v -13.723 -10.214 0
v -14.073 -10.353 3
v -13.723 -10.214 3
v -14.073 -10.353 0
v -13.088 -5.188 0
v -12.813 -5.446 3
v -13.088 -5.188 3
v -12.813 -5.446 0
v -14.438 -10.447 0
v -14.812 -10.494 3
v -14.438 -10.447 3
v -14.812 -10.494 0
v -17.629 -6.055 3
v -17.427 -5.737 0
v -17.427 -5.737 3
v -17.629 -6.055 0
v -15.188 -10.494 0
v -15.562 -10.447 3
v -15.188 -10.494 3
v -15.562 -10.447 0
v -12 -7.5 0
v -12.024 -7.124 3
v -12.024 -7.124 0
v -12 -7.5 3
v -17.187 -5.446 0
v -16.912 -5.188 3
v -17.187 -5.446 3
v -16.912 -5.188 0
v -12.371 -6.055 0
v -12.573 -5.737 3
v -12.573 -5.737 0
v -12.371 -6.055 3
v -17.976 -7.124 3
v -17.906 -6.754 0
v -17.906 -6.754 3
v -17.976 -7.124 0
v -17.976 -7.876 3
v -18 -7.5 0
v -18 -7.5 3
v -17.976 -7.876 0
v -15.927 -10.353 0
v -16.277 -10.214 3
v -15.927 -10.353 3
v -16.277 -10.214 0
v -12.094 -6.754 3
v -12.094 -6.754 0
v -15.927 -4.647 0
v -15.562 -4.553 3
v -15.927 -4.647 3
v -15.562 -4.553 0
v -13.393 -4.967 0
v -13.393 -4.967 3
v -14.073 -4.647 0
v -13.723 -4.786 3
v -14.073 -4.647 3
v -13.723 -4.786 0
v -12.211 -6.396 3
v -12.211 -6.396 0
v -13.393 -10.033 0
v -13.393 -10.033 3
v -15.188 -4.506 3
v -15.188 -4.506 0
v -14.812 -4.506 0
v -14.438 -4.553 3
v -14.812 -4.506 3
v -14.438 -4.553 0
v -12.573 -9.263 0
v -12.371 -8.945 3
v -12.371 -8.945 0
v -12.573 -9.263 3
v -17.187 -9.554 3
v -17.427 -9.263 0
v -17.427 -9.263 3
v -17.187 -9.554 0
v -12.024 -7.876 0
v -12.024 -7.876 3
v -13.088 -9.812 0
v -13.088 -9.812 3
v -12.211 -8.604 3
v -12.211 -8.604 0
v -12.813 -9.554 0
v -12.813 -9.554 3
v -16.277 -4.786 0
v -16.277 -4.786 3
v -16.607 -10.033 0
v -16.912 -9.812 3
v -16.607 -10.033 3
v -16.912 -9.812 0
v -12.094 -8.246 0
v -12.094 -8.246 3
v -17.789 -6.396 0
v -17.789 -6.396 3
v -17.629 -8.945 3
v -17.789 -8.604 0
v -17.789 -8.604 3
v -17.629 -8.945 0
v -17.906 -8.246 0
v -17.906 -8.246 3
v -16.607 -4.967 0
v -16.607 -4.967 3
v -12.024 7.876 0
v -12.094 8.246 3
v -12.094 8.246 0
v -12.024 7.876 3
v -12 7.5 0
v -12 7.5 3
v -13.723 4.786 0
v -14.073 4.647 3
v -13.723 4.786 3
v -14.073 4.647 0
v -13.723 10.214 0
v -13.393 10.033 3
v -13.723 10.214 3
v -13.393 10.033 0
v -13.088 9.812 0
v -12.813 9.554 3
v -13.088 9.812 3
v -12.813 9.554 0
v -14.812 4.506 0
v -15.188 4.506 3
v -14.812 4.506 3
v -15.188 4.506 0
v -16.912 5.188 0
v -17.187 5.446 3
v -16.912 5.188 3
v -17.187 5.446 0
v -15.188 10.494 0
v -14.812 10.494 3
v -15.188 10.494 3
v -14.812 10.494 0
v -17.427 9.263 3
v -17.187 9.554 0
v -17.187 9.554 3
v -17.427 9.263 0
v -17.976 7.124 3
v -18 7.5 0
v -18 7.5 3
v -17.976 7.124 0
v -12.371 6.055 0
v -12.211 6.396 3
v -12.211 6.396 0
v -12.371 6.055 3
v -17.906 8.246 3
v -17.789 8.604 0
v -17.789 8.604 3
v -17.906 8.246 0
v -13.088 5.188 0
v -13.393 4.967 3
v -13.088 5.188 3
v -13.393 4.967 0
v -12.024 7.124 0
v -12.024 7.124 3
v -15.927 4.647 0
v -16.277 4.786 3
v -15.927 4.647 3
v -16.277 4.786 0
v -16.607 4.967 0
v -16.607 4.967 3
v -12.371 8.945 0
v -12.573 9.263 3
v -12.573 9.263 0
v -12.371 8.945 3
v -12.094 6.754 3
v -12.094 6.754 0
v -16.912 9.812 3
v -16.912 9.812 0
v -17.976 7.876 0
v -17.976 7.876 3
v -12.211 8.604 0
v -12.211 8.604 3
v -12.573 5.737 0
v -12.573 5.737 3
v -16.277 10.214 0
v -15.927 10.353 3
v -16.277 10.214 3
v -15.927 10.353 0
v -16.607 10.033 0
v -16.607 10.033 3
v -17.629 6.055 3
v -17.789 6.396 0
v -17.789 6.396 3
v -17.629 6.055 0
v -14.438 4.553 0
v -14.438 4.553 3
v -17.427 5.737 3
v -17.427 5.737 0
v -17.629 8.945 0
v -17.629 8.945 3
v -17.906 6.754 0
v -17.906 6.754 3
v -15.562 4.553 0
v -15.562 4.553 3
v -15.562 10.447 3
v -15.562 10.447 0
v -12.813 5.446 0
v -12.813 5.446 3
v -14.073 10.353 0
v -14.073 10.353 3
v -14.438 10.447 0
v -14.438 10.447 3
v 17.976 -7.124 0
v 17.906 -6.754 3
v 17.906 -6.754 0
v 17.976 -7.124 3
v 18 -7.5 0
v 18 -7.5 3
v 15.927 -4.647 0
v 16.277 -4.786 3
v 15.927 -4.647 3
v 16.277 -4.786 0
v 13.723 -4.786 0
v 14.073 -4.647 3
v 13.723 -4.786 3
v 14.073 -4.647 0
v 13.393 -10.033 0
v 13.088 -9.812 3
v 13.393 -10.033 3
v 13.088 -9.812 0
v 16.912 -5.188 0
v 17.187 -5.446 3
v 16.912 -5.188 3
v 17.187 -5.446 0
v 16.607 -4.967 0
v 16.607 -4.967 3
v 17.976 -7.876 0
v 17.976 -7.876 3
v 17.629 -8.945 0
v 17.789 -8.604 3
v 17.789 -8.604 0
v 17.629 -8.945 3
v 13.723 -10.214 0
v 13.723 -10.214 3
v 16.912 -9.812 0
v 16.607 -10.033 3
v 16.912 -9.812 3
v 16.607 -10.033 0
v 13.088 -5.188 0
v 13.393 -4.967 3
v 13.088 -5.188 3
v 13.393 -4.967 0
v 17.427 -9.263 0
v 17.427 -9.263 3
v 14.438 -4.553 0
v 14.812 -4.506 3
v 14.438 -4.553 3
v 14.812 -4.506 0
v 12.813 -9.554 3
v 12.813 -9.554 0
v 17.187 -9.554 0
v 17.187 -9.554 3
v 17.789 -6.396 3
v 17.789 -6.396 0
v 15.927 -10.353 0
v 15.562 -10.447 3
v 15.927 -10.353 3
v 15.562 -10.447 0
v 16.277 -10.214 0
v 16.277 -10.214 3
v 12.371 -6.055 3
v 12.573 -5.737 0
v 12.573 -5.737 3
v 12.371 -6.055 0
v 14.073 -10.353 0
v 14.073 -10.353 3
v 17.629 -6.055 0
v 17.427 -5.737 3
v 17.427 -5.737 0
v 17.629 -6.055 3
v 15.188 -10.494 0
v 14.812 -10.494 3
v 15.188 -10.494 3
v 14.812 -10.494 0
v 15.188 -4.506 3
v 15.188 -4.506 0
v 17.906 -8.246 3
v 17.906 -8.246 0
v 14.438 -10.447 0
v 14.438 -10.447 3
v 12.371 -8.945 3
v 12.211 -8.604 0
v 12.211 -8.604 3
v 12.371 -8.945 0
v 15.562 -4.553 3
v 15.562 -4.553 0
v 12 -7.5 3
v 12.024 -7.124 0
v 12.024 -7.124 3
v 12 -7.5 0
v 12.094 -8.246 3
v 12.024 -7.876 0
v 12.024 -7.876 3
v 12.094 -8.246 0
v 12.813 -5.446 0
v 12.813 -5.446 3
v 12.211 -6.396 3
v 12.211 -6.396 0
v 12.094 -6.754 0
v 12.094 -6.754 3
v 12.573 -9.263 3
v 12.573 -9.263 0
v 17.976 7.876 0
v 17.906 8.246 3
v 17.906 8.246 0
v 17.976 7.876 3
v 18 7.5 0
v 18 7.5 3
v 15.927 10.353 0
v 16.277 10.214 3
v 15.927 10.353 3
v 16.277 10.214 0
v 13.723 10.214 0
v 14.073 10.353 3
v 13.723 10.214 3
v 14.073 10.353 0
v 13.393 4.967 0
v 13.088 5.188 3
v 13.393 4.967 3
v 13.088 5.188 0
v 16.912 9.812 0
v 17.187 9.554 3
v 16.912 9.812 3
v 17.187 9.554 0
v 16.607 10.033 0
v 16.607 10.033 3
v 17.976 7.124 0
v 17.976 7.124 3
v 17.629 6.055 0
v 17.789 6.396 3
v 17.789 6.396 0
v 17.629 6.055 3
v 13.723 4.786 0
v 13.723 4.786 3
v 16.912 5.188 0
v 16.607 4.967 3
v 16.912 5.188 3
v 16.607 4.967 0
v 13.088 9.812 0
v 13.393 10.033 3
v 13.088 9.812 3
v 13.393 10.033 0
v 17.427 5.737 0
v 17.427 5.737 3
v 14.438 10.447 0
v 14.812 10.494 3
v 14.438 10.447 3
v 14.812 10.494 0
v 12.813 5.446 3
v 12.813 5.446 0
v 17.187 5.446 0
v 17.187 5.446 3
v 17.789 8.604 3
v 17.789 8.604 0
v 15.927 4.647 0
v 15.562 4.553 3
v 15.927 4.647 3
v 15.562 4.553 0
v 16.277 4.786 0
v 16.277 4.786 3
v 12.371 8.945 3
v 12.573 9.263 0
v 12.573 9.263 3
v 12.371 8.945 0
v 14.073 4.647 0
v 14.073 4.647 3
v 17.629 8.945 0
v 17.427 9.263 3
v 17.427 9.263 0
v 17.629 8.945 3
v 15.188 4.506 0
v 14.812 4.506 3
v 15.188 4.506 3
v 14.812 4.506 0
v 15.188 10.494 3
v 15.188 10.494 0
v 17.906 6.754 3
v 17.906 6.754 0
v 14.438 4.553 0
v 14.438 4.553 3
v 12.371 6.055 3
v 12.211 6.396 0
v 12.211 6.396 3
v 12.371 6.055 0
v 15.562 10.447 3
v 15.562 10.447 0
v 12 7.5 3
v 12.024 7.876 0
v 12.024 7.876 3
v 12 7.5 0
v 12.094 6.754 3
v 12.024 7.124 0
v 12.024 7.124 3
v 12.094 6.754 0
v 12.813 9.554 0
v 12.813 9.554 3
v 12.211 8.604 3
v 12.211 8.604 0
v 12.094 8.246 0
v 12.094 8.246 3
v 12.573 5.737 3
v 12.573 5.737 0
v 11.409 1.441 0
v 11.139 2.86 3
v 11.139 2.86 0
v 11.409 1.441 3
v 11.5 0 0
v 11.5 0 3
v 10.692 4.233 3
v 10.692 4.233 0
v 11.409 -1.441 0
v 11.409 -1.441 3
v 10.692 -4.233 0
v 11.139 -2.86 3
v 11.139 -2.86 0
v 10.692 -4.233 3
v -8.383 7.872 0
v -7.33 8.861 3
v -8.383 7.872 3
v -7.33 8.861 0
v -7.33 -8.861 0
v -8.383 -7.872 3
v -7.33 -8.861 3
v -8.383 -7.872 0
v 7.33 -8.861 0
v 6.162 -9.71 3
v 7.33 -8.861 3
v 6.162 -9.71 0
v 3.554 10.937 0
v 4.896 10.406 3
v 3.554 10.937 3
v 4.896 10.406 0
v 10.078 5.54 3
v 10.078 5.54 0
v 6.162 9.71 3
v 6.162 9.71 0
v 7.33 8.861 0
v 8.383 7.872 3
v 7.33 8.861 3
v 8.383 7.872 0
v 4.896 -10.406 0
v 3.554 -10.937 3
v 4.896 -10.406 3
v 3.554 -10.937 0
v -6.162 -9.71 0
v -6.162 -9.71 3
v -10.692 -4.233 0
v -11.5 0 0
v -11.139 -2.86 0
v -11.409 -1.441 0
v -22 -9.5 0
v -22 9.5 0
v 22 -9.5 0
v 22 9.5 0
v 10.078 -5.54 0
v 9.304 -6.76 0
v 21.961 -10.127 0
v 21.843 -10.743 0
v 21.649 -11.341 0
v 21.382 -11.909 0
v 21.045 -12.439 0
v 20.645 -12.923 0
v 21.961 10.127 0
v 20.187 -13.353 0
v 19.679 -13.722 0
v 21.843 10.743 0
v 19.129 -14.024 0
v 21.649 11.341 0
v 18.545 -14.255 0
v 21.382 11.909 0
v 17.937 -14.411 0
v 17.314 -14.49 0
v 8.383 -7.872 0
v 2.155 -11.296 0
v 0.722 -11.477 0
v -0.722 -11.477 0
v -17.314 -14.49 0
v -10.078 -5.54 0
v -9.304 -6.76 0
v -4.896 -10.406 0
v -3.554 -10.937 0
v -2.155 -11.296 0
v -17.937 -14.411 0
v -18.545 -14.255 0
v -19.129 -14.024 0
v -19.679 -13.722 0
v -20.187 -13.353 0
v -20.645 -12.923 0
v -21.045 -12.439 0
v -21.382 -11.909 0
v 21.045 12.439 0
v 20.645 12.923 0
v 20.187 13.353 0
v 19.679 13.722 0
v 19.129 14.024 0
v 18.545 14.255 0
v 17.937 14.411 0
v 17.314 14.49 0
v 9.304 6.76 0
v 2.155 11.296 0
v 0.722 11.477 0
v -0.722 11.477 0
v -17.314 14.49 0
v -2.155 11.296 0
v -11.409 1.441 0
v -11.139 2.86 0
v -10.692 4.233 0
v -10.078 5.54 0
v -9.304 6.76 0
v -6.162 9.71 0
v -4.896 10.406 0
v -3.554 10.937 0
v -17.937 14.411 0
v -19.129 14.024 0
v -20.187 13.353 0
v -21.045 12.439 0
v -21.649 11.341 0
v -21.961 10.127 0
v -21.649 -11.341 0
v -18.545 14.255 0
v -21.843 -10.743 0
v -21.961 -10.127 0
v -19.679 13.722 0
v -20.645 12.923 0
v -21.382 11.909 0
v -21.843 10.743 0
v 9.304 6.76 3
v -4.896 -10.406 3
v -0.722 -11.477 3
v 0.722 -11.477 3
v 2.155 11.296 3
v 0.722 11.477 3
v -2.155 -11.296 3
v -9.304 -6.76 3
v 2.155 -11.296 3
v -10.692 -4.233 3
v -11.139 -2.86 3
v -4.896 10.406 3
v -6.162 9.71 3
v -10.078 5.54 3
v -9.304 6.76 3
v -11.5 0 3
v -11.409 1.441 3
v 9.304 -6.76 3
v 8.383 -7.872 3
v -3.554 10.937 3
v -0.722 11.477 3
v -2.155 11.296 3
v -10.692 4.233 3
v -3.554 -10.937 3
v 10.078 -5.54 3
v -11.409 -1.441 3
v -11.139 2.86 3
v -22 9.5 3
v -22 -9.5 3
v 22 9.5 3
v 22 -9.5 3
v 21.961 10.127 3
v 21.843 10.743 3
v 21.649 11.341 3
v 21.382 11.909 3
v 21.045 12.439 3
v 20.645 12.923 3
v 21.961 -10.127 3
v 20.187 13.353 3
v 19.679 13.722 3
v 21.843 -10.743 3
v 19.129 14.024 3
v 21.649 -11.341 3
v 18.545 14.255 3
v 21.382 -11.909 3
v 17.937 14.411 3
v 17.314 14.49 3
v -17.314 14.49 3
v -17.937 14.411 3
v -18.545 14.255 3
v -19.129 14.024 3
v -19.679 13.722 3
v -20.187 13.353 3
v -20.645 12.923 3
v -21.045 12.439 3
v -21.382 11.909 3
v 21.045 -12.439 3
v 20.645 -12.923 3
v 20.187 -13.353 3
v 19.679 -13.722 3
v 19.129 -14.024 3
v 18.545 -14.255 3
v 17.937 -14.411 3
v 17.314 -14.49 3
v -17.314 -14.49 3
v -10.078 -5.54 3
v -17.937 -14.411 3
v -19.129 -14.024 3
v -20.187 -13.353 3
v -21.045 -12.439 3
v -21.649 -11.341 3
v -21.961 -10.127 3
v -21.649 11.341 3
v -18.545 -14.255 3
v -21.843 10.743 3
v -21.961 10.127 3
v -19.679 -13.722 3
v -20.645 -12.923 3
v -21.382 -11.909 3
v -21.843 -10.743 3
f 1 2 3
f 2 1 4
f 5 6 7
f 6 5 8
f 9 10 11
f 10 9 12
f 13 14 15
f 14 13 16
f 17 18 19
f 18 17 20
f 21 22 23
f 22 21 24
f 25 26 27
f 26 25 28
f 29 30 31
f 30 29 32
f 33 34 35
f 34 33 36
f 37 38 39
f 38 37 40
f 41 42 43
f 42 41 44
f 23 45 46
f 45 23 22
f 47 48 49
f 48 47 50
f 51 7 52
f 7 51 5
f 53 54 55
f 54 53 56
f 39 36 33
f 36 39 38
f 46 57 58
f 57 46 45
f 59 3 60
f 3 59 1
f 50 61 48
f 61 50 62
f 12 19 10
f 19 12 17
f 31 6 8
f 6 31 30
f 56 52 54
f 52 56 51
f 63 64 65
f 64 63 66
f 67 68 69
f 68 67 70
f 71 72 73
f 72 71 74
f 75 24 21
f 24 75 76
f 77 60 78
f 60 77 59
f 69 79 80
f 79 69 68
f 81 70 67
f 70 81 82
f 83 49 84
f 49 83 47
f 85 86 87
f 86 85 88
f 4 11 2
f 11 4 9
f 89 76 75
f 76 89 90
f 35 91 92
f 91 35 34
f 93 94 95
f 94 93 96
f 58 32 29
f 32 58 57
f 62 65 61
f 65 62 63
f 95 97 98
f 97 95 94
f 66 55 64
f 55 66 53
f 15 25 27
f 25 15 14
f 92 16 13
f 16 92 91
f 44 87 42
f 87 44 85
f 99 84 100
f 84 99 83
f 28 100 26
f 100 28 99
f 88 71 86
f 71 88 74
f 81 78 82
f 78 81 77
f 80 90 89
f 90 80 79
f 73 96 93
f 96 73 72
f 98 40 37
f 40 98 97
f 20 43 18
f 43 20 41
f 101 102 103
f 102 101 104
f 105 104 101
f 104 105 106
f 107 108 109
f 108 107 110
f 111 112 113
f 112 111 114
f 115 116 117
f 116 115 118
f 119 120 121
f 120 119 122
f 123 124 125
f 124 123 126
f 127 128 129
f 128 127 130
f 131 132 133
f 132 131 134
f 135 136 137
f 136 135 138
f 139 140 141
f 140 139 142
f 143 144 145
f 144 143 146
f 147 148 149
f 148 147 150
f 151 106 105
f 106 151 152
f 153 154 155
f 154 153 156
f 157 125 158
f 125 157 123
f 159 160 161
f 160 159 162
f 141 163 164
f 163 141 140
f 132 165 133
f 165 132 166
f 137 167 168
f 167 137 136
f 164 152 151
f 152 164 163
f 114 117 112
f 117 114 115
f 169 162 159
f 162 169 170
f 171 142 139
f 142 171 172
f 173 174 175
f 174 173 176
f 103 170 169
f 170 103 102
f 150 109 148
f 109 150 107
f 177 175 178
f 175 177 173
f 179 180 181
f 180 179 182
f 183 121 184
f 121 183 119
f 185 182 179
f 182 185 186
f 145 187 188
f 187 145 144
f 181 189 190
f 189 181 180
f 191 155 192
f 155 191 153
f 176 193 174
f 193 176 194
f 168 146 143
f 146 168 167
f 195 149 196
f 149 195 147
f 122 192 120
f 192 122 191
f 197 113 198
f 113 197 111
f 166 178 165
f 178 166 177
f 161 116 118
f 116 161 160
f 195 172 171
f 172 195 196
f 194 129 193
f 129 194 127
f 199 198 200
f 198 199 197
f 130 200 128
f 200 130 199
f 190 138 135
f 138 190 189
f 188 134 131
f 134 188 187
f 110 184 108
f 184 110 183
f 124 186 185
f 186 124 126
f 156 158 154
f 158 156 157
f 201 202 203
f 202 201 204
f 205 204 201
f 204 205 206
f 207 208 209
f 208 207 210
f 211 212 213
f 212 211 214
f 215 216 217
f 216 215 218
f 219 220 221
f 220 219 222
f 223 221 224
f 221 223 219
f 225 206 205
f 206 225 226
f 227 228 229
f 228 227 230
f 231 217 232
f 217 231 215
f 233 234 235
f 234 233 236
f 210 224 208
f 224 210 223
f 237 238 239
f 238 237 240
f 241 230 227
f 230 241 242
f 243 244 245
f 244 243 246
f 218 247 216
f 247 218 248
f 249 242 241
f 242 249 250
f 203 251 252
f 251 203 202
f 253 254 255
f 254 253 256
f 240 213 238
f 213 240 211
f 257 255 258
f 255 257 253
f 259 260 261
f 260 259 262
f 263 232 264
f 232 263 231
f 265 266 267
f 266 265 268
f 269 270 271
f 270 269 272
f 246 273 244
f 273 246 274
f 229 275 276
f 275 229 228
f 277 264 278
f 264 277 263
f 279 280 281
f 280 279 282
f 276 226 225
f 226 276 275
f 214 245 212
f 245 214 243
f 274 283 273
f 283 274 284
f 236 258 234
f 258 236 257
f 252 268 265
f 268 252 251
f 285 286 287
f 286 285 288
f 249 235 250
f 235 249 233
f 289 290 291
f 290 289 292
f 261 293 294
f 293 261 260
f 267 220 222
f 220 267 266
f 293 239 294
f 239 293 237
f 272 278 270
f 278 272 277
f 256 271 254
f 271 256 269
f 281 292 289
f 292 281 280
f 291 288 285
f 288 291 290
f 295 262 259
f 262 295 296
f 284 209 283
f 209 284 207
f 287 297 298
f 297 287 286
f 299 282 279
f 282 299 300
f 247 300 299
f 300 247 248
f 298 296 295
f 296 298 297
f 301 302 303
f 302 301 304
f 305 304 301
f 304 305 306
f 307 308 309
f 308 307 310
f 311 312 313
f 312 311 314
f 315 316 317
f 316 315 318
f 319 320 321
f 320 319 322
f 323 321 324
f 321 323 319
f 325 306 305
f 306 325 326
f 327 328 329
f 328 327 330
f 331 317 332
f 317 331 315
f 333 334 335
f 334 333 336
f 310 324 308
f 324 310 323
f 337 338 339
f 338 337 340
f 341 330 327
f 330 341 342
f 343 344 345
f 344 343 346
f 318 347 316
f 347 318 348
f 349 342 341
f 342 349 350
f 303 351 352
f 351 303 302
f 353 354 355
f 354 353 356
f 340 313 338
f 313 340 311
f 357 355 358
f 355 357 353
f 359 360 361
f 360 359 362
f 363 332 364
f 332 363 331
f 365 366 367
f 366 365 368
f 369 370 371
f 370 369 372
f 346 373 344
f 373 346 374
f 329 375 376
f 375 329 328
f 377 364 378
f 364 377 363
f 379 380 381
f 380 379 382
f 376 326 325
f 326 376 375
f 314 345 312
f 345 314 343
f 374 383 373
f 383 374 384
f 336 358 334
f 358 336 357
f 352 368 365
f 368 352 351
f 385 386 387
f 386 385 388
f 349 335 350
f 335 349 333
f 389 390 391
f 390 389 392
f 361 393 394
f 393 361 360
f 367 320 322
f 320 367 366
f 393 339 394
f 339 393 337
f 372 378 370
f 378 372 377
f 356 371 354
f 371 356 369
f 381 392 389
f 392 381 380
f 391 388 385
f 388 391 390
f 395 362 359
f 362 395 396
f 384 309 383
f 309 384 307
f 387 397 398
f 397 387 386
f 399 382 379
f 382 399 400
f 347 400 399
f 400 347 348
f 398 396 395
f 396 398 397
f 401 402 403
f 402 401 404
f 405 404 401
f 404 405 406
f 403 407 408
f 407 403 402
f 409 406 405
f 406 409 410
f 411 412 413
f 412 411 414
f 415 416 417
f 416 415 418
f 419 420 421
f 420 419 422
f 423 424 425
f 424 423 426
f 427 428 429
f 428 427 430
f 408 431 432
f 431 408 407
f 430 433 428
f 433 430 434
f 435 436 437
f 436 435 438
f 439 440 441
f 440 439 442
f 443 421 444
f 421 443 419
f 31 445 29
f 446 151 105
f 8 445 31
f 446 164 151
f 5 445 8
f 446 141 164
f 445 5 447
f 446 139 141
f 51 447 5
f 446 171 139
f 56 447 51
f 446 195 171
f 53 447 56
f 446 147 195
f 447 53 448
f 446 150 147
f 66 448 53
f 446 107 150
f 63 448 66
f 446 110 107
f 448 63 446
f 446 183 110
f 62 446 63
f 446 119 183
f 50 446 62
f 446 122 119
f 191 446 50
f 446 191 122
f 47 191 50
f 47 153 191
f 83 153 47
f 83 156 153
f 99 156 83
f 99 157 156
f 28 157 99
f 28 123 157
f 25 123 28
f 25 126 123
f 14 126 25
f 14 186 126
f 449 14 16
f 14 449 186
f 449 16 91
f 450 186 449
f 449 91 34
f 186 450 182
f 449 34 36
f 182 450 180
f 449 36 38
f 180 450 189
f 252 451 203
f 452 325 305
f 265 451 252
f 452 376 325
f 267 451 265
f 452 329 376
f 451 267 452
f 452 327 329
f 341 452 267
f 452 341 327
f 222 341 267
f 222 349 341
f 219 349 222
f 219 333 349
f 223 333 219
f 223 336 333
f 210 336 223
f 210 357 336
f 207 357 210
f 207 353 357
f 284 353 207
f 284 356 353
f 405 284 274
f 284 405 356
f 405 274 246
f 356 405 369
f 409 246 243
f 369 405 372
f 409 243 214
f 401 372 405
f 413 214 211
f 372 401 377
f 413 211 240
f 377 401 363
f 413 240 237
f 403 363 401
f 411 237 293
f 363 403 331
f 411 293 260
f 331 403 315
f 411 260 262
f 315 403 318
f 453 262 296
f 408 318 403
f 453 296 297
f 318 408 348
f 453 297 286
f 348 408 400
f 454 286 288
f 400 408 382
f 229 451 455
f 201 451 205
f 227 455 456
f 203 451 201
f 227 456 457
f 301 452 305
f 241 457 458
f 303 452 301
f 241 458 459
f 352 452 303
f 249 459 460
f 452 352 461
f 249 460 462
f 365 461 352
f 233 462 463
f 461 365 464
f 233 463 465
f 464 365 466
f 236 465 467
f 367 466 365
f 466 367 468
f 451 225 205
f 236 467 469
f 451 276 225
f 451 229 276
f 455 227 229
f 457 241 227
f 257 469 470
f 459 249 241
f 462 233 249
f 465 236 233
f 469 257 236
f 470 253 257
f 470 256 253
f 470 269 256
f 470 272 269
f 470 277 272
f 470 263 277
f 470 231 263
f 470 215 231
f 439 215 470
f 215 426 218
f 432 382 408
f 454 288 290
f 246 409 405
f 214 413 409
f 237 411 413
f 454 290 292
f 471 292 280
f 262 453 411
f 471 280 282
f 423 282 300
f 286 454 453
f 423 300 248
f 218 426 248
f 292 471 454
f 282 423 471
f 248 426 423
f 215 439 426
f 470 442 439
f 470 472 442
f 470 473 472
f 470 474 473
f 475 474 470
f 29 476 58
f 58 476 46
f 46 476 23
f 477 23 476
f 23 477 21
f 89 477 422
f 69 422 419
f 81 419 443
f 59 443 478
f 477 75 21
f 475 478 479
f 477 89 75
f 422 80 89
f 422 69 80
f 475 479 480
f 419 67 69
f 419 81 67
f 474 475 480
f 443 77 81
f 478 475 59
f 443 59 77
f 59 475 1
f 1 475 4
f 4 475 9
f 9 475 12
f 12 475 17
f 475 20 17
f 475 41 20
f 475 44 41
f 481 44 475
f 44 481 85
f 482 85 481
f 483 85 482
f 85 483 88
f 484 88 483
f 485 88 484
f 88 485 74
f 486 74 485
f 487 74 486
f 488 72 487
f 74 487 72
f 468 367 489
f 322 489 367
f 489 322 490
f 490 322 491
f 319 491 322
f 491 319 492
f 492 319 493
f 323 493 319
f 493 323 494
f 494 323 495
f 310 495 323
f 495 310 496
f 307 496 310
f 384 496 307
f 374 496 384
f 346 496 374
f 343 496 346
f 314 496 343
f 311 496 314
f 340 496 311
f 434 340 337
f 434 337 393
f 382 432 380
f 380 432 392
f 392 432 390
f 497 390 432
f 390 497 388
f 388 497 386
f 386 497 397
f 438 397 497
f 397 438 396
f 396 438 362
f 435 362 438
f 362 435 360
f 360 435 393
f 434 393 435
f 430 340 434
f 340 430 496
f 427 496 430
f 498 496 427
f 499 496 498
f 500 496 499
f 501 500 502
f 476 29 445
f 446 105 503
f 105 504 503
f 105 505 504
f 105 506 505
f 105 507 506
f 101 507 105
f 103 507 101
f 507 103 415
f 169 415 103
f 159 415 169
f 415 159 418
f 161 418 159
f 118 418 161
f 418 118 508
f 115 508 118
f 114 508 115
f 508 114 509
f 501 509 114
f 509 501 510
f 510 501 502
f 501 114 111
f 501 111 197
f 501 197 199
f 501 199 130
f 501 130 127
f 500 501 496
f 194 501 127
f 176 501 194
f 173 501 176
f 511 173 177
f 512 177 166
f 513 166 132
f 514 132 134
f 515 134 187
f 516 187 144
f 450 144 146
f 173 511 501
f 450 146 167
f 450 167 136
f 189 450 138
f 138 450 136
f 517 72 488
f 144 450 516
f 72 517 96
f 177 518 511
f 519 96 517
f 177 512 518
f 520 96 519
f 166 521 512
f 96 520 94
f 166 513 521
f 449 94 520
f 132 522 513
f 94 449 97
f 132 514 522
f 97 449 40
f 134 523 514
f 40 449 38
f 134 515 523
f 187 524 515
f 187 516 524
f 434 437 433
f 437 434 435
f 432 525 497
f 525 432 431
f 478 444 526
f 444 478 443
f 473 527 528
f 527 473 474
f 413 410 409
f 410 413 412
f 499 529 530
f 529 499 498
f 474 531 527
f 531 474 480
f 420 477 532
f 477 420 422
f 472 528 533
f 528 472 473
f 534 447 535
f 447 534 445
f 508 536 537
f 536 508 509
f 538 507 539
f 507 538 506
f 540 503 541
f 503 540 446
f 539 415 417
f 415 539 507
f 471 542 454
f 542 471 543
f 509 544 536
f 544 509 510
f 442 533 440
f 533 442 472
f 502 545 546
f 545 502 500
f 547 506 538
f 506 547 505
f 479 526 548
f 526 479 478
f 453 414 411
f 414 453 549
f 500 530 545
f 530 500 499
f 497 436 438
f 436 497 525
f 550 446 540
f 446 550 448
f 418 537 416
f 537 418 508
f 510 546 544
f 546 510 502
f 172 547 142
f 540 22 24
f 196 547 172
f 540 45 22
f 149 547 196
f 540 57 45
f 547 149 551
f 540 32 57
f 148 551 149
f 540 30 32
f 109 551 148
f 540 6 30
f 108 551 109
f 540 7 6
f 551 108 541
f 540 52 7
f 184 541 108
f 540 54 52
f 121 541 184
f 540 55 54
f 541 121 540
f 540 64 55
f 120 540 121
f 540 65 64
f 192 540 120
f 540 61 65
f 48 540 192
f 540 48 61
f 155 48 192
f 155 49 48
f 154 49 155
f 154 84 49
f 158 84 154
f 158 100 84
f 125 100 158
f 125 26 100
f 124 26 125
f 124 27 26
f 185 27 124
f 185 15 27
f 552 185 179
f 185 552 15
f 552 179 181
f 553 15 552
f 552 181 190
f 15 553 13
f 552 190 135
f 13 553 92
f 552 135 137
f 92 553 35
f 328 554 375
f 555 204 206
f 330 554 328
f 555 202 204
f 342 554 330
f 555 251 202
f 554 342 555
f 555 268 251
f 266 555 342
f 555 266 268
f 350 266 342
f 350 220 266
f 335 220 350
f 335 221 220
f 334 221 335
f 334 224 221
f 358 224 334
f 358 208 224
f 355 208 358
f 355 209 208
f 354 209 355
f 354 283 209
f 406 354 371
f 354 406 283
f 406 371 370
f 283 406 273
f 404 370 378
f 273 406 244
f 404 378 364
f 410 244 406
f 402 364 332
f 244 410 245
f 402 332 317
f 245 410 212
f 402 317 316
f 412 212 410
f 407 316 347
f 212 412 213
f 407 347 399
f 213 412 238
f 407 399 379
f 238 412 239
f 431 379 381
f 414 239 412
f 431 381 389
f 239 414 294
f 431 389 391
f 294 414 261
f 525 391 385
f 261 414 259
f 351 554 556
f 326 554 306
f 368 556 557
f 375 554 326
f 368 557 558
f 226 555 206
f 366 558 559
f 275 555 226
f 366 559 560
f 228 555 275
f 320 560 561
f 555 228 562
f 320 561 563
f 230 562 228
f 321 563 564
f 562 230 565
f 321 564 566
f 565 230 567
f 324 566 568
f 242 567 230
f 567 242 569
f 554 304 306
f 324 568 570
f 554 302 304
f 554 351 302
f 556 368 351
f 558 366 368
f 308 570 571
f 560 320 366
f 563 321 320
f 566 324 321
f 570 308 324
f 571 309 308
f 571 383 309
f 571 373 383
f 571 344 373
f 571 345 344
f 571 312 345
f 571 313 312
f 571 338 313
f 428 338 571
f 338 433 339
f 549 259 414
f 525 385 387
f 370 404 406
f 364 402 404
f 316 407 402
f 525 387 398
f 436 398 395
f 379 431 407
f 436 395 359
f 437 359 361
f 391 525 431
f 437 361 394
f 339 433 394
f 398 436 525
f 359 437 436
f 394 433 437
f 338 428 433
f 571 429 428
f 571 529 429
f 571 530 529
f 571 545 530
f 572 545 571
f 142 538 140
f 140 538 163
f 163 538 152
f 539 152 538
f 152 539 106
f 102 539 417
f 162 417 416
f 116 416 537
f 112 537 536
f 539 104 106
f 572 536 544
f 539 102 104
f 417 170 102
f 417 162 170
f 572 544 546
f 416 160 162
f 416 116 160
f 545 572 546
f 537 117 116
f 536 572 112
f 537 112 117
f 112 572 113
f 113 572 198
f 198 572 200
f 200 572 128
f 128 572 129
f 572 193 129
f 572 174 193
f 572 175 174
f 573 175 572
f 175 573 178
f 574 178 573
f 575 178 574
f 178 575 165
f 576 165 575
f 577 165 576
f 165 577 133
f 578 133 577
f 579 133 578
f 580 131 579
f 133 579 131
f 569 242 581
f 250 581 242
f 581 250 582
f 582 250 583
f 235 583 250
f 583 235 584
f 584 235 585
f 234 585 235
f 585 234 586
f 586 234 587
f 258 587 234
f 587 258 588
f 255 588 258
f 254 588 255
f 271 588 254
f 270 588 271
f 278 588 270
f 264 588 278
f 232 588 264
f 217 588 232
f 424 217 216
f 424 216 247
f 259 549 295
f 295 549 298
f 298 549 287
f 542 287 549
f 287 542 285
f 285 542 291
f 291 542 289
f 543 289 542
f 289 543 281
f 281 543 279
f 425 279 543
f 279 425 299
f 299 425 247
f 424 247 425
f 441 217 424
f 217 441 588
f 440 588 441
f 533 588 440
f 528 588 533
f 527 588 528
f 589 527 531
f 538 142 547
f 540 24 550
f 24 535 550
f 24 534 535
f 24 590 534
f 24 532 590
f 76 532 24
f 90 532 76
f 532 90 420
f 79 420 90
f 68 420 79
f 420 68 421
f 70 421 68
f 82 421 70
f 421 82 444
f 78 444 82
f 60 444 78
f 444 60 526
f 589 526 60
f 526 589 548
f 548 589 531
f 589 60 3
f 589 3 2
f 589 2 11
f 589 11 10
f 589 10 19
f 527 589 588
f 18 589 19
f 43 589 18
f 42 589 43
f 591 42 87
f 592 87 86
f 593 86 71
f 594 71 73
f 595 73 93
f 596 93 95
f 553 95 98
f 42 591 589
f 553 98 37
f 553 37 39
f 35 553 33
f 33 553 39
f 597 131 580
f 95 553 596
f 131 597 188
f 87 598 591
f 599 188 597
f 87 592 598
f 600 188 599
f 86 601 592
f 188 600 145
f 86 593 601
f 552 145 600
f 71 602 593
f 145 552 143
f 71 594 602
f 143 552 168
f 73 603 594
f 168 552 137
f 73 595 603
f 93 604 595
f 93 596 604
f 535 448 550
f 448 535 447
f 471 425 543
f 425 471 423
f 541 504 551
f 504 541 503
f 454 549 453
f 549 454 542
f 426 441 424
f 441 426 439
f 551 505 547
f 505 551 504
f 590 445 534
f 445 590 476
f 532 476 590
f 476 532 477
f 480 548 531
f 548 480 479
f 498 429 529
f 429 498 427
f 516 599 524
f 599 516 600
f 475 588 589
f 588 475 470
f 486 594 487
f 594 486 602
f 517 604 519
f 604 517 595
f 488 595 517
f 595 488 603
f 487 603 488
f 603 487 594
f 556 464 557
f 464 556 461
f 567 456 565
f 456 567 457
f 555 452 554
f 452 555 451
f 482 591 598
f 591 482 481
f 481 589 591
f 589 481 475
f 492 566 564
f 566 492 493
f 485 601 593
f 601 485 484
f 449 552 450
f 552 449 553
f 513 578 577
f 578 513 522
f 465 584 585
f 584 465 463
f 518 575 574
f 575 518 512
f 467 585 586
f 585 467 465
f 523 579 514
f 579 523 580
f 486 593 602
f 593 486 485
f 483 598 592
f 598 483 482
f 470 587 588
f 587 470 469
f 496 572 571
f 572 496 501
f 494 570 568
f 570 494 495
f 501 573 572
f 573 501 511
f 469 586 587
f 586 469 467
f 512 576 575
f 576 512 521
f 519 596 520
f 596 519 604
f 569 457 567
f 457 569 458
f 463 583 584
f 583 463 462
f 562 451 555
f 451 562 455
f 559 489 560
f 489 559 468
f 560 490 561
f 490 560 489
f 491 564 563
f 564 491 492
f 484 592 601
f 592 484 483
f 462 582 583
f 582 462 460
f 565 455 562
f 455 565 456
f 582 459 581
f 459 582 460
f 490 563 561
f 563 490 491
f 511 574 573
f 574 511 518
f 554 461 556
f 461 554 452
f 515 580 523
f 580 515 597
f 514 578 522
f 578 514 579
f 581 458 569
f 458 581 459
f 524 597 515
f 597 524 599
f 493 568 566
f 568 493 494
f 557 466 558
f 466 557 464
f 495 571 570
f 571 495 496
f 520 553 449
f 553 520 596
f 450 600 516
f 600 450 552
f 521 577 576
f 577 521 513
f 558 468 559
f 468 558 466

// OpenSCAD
$fn = 50;


difference() {
	union() {
		hull() {
			translate(v = [-17.0000000000, 9.5000000000, 0]) {
				cylinder(h = 3, r = 5);
			}
			translate(v = [17.0000000000, 9.5000000000, 0]) {
				cylinder(h = 3, r = 5);
			}
			translate(v = [-17.0000000000, -9.5000000000, 0]) {
				cylinder(h = 3, r = 5);
			}
			translate(v = [17.0000000000, -9.5000000000, 0]) {
				cylinder(h = 3, r = 5);
			}
		}
	}
	union() {
		#translate(v = [-15.0000000000, -7.5000000000, -100.0000000000]) {
			cylinder(h = 200, r = 3.0000000000);
		}
		#translate(v = [-15.0000000000, 7.5000000000, -100.0000000000]) {
			cylinder(h = 200, r = 3.0000000000);
		}
		#translate(v = [15.0000000000, -7.5000000000, -100.0000000000]) {
			cylinder(h = 200, r = 3.0000000000);
		}
		#translate(v = [15.0000000000, 7.5000000000, -100.0000000000]) {
			cylinder(h = 200, r = 3.0000000000);
		}
		#cylinder(h = 3, r = 11.5000000000);
	}
}
